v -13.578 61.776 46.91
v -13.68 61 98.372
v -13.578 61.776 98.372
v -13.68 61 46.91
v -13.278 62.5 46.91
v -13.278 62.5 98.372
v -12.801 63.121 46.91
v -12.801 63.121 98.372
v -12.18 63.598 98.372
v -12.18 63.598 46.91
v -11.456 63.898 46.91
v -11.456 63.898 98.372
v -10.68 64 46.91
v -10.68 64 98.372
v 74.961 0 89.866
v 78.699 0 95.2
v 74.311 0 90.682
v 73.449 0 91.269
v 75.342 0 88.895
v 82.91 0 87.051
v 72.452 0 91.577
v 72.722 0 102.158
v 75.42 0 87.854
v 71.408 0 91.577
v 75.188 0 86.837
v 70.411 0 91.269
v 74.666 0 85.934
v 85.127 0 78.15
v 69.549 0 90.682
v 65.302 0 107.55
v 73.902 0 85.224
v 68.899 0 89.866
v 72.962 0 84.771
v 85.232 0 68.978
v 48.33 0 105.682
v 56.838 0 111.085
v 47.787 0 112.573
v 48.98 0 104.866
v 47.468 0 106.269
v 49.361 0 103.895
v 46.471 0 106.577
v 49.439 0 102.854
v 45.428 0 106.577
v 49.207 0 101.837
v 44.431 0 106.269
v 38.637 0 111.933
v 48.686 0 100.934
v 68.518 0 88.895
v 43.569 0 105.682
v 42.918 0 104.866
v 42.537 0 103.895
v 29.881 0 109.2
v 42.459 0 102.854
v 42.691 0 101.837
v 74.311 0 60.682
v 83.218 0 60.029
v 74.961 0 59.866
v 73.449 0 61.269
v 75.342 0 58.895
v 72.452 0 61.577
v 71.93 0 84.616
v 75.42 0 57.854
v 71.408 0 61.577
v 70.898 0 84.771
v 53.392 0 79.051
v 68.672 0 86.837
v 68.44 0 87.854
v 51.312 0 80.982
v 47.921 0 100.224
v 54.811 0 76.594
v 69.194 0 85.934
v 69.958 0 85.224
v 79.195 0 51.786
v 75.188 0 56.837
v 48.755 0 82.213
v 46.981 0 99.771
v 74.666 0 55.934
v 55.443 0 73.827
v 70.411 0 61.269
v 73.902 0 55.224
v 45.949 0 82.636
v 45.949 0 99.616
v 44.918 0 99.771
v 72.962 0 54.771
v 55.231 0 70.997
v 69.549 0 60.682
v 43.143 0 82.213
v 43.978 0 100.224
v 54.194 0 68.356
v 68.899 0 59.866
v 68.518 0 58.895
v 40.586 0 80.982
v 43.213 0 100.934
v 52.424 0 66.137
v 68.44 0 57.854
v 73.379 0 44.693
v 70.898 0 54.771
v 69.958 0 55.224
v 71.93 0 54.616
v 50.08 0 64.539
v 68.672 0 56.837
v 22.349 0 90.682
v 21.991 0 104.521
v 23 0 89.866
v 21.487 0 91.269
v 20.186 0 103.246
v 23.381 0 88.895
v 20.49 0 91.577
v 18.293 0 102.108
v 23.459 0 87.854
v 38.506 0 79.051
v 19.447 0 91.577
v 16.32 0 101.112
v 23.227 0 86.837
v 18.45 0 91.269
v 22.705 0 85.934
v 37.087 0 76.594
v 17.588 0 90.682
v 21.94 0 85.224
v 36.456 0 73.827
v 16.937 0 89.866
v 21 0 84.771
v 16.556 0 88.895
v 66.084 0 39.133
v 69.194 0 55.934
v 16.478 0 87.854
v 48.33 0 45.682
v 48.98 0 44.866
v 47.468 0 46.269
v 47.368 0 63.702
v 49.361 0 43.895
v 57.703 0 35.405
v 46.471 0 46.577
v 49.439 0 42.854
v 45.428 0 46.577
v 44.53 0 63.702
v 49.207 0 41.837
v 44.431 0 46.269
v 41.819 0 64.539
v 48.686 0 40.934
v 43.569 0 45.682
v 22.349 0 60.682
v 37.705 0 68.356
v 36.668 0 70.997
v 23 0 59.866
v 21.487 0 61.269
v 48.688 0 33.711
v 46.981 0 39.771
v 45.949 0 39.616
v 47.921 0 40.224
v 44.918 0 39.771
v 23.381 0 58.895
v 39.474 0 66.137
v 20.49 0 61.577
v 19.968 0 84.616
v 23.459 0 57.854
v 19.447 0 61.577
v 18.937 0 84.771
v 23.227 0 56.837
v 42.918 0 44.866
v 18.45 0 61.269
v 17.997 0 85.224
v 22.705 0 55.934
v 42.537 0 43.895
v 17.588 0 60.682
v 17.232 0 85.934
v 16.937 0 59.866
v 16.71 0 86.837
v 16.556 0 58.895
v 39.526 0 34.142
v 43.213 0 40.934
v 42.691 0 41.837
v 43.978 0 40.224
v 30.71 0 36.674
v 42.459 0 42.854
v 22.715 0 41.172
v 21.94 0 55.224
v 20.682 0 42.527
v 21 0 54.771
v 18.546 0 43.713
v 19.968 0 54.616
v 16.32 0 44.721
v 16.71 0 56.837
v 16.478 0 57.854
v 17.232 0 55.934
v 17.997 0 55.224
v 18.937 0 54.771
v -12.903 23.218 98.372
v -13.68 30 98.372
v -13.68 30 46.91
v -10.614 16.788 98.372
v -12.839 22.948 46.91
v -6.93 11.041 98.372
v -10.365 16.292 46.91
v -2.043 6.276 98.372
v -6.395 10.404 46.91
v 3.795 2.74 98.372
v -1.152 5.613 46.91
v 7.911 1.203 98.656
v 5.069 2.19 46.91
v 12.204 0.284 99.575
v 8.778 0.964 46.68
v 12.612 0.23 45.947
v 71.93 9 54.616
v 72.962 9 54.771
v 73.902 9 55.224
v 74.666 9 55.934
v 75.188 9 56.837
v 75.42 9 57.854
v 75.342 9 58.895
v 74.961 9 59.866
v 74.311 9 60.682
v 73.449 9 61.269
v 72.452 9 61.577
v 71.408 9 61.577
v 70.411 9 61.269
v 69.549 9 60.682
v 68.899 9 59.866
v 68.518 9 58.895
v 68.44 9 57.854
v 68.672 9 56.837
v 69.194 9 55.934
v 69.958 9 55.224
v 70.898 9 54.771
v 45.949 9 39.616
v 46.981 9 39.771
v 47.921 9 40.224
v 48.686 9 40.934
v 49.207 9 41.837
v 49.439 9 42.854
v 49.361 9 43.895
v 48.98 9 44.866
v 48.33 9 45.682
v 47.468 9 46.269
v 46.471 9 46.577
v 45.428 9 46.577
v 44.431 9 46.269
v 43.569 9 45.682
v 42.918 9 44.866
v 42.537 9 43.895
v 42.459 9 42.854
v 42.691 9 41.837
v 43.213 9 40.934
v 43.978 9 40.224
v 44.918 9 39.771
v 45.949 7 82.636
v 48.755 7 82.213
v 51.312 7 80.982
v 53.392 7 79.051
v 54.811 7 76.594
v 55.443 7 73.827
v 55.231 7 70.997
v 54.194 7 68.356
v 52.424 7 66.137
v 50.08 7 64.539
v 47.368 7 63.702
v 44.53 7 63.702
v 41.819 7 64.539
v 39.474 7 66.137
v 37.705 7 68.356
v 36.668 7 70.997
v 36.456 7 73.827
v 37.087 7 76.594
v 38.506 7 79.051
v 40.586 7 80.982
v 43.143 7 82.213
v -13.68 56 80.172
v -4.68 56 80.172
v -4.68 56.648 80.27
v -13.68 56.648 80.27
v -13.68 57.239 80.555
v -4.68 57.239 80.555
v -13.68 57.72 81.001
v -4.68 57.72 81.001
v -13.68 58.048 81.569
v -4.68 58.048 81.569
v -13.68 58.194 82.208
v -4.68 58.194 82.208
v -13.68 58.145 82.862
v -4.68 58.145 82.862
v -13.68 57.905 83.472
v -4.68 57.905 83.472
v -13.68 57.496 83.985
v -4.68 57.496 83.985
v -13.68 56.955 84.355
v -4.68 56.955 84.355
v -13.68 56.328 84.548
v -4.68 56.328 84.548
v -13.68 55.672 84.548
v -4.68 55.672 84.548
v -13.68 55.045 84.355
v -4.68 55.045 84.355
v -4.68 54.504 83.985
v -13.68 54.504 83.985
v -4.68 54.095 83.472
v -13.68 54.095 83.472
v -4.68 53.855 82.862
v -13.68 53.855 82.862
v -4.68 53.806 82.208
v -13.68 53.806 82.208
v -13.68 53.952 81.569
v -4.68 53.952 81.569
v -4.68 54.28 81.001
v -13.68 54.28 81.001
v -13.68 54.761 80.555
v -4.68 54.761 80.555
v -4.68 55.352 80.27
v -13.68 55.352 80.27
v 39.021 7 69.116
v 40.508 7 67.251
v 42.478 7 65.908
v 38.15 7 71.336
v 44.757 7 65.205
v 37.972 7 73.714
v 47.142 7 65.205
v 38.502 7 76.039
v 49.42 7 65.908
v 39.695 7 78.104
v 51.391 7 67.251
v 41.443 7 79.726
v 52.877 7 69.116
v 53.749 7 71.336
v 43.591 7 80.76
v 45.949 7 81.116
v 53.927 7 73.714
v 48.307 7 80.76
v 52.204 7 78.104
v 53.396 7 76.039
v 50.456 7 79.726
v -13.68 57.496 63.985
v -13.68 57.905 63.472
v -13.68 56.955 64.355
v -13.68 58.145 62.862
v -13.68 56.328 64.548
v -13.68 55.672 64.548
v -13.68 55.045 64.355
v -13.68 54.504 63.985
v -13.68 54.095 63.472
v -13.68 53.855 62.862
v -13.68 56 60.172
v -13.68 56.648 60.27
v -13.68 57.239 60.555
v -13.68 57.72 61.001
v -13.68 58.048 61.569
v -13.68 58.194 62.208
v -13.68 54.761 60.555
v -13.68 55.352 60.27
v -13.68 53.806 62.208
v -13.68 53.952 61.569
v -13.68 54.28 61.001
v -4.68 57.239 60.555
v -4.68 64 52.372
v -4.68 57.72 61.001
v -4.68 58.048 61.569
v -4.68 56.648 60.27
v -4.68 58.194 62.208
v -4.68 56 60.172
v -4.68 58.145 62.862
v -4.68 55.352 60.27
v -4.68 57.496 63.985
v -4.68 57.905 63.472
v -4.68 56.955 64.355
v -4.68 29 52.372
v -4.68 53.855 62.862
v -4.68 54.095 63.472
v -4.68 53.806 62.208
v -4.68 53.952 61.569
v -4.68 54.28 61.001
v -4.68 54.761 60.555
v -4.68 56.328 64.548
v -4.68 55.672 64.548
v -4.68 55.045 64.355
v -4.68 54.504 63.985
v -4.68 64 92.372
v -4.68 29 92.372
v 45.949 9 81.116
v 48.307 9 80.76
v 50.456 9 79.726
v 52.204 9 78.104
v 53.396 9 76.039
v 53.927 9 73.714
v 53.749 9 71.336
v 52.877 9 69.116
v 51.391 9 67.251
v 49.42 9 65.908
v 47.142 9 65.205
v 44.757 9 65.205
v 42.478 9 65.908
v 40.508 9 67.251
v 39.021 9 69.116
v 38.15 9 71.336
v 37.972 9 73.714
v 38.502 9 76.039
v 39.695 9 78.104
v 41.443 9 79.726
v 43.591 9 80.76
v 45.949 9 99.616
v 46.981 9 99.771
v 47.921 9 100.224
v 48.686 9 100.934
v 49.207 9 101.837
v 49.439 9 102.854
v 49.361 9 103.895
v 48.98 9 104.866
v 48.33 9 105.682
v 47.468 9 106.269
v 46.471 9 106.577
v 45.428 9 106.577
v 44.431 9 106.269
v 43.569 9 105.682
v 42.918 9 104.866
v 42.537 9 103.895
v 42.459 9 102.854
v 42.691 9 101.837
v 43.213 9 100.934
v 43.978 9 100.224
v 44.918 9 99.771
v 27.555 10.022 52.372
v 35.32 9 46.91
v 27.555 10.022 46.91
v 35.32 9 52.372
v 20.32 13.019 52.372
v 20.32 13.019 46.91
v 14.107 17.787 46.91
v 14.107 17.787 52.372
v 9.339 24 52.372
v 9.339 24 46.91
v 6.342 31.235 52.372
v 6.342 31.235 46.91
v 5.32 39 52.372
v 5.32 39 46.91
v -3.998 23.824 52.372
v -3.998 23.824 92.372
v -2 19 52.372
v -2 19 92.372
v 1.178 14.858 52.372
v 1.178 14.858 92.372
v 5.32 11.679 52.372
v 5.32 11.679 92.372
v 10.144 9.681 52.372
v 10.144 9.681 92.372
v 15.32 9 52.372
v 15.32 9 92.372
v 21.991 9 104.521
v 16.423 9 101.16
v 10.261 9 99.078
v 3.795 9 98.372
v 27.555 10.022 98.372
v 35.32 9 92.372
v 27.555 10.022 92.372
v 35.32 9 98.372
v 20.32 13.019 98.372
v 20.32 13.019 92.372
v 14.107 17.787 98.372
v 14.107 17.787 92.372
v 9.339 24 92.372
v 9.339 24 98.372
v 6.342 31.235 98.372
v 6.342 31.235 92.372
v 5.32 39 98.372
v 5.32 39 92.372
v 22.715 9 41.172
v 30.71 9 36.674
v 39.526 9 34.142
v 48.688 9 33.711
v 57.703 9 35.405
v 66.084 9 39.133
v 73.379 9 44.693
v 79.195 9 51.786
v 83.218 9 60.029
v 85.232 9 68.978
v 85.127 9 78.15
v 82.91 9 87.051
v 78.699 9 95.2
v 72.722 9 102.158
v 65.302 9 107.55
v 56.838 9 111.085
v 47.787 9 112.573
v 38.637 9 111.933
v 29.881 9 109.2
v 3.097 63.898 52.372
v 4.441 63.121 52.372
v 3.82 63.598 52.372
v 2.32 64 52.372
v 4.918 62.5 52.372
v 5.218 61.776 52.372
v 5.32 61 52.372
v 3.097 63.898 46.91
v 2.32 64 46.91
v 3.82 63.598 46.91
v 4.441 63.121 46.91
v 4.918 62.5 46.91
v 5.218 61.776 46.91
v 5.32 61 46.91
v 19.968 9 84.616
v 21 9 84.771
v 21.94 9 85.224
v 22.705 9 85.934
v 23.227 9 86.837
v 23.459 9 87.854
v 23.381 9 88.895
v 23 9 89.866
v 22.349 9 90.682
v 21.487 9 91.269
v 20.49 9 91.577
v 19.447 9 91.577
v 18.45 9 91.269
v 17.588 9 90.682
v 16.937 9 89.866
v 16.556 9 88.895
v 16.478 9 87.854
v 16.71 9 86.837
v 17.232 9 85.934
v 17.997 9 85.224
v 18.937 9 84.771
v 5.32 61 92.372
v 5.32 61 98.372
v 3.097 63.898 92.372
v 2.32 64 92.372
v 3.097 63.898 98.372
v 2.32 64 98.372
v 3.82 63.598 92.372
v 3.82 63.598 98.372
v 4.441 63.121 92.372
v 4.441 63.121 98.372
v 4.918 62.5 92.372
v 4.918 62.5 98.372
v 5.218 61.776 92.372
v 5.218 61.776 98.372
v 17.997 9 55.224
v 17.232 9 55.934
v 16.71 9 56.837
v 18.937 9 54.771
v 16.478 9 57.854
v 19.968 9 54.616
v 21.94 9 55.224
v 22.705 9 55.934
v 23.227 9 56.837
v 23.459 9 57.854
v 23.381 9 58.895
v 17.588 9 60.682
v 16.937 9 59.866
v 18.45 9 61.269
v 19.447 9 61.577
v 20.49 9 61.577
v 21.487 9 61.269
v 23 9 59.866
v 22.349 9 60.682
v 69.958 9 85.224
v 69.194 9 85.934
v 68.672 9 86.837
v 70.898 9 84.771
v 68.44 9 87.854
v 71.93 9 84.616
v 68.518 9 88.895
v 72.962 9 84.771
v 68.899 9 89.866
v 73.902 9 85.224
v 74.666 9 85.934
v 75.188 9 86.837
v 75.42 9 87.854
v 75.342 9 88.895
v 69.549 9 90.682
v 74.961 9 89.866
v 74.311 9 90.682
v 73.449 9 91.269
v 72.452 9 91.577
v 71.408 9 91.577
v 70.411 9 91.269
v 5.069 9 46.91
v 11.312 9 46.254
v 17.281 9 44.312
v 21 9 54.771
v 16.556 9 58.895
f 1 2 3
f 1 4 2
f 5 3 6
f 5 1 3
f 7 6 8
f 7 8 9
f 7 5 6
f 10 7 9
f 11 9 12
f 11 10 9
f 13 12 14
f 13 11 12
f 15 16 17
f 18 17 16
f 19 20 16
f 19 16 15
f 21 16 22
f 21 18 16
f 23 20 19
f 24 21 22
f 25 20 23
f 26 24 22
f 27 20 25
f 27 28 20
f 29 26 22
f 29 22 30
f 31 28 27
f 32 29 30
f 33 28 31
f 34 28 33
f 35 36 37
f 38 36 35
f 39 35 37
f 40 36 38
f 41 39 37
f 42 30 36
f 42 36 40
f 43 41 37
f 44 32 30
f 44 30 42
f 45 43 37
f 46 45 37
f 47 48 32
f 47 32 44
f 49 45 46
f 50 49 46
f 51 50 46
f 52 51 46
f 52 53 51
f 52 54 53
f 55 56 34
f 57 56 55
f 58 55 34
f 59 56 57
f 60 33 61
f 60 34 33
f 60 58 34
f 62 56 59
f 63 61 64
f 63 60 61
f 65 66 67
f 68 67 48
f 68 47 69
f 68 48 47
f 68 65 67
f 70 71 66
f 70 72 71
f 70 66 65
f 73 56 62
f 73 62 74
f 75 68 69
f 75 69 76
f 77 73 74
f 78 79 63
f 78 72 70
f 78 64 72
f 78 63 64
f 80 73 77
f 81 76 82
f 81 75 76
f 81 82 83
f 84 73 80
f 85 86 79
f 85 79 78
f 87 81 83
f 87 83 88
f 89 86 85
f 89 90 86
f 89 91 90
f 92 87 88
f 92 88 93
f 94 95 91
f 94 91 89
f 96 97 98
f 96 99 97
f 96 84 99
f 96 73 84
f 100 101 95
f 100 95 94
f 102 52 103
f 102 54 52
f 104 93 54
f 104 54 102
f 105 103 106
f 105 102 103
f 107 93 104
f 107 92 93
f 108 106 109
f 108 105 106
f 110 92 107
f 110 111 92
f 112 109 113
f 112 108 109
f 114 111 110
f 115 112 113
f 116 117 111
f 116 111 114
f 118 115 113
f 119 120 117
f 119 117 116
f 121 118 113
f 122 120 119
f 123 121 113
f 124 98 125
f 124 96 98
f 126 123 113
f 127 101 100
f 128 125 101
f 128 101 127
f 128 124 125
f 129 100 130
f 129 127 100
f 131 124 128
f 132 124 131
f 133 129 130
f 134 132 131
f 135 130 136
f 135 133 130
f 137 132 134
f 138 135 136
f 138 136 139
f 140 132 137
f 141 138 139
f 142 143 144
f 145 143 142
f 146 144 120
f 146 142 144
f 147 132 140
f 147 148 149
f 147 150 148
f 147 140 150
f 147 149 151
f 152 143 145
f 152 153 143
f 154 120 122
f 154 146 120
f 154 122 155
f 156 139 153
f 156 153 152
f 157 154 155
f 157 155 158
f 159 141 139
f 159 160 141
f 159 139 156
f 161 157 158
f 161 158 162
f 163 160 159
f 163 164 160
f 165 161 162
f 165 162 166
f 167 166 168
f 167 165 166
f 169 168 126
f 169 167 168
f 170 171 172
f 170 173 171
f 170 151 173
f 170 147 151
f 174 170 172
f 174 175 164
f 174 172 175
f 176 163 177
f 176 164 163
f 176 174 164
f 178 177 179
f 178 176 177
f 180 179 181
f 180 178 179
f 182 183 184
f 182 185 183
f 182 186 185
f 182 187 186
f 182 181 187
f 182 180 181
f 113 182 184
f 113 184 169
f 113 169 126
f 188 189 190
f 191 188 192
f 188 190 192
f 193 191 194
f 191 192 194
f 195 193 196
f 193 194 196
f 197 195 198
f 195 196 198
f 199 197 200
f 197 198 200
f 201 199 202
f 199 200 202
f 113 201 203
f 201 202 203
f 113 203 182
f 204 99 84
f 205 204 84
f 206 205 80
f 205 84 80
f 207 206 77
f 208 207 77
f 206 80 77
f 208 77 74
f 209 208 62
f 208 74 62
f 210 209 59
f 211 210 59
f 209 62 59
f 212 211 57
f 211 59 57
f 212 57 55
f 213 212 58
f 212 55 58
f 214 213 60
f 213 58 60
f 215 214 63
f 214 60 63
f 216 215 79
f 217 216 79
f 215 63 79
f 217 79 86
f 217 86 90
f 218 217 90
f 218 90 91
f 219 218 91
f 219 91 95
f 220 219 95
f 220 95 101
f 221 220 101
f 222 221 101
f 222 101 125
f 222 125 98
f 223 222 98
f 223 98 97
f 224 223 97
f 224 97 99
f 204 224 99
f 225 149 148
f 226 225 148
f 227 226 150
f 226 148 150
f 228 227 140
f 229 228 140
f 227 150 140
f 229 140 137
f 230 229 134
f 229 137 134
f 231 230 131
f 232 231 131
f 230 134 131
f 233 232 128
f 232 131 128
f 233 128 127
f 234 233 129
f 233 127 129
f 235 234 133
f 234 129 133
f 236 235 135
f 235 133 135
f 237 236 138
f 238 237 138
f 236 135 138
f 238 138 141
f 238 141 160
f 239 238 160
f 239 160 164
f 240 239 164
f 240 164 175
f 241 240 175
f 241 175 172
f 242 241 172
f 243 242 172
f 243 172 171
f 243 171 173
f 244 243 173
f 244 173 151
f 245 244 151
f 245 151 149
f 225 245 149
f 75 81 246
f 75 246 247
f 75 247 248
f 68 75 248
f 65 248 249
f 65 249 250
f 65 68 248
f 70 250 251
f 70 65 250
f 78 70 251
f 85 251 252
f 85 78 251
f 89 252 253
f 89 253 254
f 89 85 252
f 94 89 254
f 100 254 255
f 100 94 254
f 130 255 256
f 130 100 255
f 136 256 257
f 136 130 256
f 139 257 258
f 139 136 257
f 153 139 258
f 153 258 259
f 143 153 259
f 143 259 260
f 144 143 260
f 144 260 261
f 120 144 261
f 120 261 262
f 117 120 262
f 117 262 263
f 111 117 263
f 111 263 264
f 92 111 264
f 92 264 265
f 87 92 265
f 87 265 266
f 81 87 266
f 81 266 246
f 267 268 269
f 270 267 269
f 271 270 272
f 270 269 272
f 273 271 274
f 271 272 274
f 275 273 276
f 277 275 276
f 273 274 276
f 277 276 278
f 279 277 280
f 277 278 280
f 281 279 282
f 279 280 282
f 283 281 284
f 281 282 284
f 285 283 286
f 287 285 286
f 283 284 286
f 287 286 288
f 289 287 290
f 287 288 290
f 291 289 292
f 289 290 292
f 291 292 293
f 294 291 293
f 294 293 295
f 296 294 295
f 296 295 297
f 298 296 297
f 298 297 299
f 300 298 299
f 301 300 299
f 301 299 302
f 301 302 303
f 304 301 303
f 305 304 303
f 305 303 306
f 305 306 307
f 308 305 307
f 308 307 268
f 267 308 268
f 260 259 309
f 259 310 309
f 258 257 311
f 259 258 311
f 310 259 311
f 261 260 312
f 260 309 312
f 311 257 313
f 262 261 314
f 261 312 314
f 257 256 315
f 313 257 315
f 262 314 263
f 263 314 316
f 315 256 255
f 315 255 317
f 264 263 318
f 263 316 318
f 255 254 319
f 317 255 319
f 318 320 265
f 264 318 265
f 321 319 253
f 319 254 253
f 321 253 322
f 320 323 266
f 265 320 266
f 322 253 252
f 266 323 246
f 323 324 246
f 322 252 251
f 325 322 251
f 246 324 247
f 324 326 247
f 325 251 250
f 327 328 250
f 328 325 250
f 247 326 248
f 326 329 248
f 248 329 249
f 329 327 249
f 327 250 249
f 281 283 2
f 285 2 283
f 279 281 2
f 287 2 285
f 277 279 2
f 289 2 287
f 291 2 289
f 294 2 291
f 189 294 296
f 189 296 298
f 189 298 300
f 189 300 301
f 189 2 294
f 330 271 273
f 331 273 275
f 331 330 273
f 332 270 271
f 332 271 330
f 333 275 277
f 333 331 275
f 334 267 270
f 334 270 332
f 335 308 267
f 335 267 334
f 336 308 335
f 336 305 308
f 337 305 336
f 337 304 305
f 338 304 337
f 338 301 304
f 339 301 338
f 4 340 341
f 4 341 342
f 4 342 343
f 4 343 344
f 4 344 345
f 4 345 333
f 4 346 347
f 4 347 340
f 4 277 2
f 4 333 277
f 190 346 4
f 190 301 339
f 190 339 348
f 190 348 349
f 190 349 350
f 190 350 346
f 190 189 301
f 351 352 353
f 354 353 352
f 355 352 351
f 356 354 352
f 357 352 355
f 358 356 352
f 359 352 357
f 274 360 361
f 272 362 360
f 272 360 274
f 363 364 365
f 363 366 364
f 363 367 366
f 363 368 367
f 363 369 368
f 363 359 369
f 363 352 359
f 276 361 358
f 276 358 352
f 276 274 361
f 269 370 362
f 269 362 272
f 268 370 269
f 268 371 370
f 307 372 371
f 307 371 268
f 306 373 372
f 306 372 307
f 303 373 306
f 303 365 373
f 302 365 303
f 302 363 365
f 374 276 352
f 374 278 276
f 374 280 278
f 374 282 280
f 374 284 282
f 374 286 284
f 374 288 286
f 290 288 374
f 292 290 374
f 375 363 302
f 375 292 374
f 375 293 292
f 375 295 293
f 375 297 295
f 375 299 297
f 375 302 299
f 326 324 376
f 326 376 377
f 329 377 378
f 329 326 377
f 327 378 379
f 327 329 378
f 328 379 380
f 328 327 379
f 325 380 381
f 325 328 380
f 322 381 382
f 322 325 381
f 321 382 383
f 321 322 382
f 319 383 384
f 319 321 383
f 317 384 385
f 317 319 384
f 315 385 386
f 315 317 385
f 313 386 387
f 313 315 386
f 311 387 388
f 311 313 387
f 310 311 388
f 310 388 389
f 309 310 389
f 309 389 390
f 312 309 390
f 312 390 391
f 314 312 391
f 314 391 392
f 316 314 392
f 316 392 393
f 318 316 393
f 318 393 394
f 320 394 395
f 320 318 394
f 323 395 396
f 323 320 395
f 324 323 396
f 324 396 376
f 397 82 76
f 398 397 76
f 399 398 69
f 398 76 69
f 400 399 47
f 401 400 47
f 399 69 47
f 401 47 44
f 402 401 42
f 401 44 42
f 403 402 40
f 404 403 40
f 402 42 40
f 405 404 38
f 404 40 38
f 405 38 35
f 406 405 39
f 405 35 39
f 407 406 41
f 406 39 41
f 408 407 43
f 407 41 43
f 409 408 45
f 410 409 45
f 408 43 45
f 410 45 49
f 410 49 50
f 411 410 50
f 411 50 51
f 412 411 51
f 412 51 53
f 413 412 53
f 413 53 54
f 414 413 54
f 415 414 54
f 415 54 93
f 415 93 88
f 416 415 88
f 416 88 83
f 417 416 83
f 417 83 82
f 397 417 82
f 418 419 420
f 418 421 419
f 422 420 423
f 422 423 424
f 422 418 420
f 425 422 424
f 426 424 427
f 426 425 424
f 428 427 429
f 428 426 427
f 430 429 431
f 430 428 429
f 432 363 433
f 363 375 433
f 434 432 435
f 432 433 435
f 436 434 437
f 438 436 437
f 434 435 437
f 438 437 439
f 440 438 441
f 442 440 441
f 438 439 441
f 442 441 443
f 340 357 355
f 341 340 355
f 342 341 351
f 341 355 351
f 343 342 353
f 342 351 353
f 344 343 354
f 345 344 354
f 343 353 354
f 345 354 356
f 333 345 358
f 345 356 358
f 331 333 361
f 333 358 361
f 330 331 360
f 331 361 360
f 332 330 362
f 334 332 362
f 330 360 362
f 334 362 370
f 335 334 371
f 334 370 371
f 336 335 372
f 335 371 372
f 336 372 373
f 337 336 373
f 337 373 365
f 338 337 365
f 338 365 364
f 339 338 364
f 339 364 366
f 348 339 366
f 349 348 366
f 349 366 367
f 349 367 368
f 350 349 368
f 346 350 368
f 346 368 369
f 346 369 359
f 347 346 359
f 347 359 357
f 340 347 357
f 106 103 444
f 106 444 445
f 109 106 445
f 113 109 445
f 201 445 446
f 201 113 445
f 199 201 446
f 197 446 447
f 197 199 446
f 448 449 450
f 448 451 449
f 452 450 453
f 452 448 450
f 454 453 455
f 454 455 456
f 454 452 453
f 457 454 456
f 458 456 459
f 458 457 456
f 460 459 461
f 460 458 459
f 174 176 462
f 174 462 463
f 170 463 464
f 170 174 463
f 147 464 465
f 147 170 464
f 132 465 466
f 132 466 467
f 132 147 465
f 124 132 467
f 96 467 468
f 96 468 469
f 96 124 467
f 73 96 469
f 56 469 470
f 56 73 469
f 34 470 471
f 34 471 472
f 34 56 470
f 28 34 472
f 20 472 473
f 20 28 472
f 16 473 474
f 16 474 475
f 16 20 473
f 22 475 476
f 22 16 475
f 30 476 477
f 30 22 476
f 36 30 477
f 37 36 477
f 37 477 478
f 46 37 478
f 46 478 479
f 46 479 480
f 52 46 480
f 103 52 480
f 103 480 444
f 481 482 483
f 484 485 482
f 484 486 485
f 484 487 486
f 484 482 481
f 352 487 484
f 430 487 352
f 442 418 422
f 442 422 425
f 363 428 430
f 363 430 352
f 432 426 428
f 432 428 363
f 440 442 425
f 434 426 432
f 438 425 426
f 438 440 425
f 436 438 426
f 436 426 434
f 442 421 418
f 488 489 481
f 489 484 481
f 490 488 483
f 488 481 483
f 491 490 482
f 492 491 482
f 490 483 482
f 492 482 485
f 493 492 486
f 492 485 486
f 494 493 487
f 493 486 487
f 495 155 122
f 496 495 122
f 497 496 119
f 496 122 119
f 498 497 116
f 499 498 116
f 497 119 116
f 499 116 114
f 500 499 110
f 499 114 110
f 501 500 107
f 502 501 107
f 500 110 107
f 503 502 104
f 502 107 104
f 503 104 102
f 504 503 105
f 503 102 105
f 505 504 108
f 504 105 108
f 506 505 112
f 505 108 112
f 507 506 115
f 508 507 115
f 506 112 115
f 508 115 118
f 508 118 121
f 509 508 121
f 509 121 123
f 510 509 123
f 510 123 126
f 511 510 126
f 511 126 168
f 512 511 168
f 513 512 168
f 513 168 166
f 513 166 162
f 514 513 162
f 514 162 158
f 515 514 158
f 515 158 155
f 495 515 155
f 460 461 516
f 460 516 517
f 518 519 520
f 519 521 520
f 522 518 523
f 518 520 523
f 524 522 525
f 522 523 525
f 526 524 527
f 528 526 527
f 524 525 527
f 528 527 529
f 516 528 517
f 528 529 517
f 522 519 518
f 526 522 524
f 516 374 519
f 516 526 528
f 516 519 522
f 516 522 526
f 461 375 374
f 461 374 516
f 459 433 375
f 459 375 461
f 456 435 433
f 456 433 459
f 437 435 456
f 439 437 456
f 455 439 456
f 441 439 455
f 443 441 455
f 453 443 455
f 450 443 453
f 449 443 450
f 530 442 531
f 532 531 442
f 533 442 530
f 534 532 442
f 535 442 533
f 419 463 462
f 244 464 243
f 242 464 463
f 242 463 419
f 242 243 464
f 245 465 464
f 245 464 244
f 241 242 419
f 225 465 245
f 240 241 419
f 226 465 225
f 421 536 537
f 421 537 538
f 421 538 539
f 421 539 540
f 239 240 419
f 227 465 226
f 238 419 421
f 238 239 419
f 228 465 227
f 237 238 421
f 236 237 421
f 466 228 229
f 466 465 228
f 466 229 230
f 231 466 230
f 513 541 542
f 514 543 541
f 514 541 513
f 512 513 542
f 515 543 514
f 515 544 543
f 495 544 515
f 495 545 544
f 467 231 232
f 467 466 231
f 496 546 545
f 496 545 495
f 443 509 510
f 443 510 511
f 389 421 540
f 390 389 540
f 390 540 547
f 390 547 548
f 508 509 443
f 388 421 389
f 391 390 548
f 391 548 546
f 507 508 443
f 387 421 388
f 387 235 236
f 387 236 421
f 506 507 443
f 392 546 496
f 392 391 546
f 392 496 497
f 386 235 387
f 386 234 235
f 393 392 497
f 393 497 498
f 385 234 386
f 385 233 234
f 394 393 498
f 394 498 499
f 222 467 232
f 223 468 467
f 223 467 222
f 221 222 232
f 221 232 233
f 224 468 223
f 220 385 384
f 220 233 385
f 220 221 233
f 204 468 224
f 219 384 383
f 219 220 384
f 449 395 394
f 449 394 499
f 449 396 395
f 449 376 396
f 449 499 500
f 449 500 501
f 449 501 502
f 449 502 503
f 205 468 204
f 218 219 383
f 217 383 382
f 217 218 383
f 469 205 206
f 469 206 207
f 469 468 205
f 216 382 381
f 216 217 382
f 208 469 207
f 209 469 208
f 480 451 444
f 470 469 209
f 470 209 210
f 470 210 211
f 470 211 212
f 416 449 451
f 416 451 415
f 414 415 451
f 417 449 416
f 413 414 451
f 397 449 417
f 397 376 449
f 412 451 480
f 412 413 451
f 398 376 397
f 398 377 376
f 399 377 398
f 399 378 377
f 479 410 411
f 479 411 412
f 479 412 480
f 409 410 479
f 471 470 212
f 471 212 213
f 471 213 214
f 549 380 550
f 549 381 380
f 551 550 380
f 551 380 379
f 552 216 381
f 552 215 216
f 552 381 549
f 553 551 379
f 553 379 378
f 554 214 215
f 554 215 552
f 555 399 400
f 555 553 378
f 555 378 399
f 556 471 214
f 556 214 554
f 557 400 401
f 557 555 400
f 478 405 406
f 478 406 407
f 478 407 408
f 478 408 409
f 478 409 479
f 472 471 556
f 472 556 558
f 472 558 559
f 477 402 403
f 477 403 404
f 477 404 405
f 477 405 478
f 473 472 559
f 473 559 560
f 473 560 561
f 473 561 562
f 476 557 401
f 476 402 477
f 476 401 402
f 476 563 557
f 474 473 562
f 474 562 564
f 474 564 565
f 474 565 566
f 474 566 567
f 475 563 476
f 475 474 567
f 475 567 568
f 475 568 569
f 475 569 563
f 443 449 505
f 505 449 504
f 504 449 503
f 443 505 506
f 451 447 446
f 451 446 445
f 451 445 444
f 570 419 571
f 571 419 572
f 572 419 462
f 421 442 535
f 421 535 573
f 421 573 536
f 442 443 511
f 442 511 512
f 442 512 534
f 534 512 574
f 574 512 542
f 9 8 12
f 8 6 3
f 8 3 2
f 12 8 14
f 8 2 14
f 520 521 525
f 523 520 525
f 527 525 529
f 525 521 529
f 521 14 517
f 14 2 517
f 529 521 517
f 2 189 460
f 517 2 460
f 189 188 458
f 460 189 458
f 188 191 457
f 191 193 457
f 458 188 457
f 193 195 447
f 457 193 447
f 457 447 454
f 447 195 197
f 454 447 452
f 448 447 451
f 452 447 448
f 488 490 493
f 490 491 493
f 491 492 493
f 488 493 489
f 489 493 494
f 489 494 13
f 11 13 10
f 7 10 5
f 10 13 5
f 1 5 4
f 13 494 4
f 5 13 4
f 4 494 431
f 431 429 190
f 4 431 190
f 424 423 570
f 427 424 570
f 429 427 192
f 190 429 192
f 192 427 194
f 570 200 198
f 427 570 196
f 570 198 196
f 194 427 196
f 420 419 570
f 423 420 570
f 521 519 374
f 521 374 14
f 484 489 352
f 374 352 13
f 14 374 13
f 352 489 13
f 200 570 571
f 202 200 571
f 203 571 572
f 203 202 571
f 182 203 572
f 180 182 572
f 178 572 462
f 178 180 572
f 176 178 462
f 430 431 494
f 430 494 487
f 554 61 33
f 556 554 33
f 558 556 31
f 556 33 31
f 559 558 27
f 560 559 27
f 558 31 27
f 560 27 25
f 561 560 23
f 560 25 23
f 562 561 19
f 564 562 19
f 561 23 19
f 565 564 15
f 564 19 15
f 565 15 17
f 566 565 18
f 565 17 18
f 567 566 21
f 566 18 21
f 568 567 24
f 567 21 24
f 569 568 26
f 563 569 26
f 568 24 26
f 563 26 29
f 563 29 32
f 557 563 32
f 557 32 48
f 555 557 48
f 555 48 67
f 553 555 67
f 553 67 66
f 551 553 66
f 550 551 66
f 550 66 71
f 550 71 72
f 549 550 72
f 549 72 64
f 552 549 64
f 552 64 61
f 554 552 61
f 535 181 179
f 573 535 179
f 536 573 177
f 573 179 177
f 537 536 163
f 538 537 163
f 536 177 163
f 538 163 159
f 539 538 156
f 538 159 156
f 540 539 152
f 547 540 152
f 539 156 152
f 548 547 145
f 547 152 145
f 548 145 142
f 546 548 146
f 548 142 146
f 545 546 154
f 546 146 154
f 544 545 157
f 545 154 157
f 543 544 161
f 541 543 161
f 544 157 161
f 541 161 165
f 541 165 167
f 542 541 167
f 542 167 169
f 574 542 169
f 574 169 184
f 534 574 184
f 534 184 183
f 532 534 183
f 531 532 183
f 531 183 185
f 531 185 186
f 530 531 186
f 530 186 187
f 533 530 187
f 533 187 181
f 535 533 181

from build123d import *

# Parameters (mm, degrees)
SKETCH1_R           = 9.52
BOSS_EXTRUDE1_DEPTH = 9
BOSS_EXTRUDE2_DEPTH = 55
FILLET1_R           = 30
FILLET2_R           = 20
FILLET3_R           = 30
FILLET8_R           = 3
SKETCH3_R           = 2.2
CUT_EXTRUDE1_DEPTH  = 56
BOSS_EXTRUDE3_START = -2
SKETCH4_R           = 9.52
SKETCH4_R_2         = 8
BOSS_EXTRUDE3_DEPTH = 2
SKETCH5_R           = 3.5
CUT_EXTRUDE2_DEPTH  = 24


with BuildPart() as part:
    # Sketch1 → Boss-Extrude1 (new body)
    with BuildSketch(Plane(origin=(0, 0, 0), x_dir=(1, 0, 0), z_dir=(0, 1, 0))):
        with BuildLine():
            ThreePointArc((21.991235952, -104.520703773), (13.398585056, -99.951074742), (3.795292642, -98.372488761))
            Line((3.795292642, -98.372488761), (-13.679941451, -98.372488761))
            Line((-13.679941451, -98.372488761), (-13.679941451, -46.910148214))
            Line((-13.679941451, -46.910148214), (5.06929783, -46.910148214))
            ThreePointArc((5.06929783, -46.910148214), (14.347129848, -45.439463541), (22.715310843, -41.171603751))
            ThreePointArc((22.715310843, -41.171603751), (85.44664803, -73.567305733), (21.991235952, -104.520703773))
        make_face()
        with Locations(Location((45.949227976, -73.115853541, 0), (0, 0, 270))):
            Circle(SKETCH1_R, mode=Mode.SUBTRACT)
    extrude(amount=BOSS_EXTRUDE1_DEPTH)

    # Sketch2 → Boss-Extrude2 (add)
    with BuildSketch(Plane(origin=(0, 9, 0), x_dir=(1, 0, 0), z_dir=(0, 1, 0))):
        Polygon((-13.679941451, -46.910148214), (-4.679941451, -46.910148214), (5.320058549, -46.910148214), (5.320058549, -52.372488761), (-4.679941451, -52.372488761), (-4.679941451, -92.372488761), (5.320058549, -92.372488761), (5.320058549, -98.372488761), (-4.679941451, -98.372488761), (-13.679941451, -98.372488761), align=None)
    extrude(amount=BOSS_EXTRUDE2_DEPTH)

    # Fillet1
    fillet1_edges = [part.edges().sort_by_distance(p)[0] for p in [
        (5.320058549, 9, 95.372488761),
        (5.320058549, 9, 49.641318487),
    ]]
    fillet(fillet1_edges, radius=FILLET1_R)

    # Fillet2
    fillet2_edges = [part.edges().sort_by_distance(p)[0] for p in [
        (-4.679941451, 9, 72.372488761),
    ]]
    fillet(fillet2_edges, radius=FILLET2_R)

    # Fillet3
    fillet3_edges = [part.edges().sort_by_distance(p)[0] for p in [
        (-13.679941451, 0, 72.641318487),
    ]]
    fillet(fillet3_edges, radius=FILLET3_R)

    # Fillet8
    fillet8_edges = [part.edges().sort_by_distance(p)[0] for p in [
        (-13.679941451, 64, 72.641318487),
        (5.320058549, 64, 95.372488761),
        (5.320058549, 64, 49.641318487),
    ]]
    fillet(fillet8_edges, radius=FILLET8_R)

    # Sketch3 → Cut-Extrude1 (cut)
    with BuildSketch(Plane(origin=(-4.679941451, 0, 0), x_dir=(0, 0, -1), z_dir=(1, 0, 0))):
        with Locations((-62.372488761, 56)):
            Circle(SKETCH3_R)
        with Locations((-82.372488761, 56)):
            Circle(SKETCH3_R)
    extrude(amount=-CUT_EXTRUDE1_DEPTH, mode=Mode.SUBTRACT)

    # Sketch4 → Boss-Extrude3 (add)
    with BuildSketch(Plane(origin=(0, 9, 0), x_dir=(1, 0, 0), z_dir=(0, 1, 0)).offset(BOSS_EXTRUDE3_START)):
        with Locations(Location((45.949227976, -73.115853541, 0), (0, 0, 270))):
            Circle(SKETCH4_R)
        with Locations(Location((45.949227976, -73.115853541, 0), (0, 0, 270))):
            Circle(SKETCH4_R_2, mode=Mode.SUBTRACT)
    extrude(amount=BOSS_EXTRUDE3_DEPTH)

    # Sketch5 → Cut-Extrude2 (cut)
    with BuildSketch(Plane.XZ):
        with Locations(Location((19.968465863, 88.115853541, 0), (0, 0, 270))):
            Circle(SKETCH5_R)
        with Locations(Location((45.949227976, 103.115853541, 0), (0, 0, 270))):
            Circle(SKETCH5_R)
        with Locations(Location((71.92999009, 88.115853541, 0), (0, 0, 270))):
            Circle(SKETCH5_R)
        with Locations(Location((71.92999009, 58.115853541, 0), (0, 0, 270))):
            Circle(SKETCH5_R)
        with Locations(Location((45.949227976, 43.115853541, 0), (0, 0, 270))):
            Circle(SKETCH5_R)
        with Locations(Location((19.968465863, 58.115853541, 0), (0, 0, 270))):
            Circle(SKETCH5_R)
    extrude(amount=-CUT_EXTRUDE2_DEPTH, mode=Mode.SUBTRACT)


solid = part.part
